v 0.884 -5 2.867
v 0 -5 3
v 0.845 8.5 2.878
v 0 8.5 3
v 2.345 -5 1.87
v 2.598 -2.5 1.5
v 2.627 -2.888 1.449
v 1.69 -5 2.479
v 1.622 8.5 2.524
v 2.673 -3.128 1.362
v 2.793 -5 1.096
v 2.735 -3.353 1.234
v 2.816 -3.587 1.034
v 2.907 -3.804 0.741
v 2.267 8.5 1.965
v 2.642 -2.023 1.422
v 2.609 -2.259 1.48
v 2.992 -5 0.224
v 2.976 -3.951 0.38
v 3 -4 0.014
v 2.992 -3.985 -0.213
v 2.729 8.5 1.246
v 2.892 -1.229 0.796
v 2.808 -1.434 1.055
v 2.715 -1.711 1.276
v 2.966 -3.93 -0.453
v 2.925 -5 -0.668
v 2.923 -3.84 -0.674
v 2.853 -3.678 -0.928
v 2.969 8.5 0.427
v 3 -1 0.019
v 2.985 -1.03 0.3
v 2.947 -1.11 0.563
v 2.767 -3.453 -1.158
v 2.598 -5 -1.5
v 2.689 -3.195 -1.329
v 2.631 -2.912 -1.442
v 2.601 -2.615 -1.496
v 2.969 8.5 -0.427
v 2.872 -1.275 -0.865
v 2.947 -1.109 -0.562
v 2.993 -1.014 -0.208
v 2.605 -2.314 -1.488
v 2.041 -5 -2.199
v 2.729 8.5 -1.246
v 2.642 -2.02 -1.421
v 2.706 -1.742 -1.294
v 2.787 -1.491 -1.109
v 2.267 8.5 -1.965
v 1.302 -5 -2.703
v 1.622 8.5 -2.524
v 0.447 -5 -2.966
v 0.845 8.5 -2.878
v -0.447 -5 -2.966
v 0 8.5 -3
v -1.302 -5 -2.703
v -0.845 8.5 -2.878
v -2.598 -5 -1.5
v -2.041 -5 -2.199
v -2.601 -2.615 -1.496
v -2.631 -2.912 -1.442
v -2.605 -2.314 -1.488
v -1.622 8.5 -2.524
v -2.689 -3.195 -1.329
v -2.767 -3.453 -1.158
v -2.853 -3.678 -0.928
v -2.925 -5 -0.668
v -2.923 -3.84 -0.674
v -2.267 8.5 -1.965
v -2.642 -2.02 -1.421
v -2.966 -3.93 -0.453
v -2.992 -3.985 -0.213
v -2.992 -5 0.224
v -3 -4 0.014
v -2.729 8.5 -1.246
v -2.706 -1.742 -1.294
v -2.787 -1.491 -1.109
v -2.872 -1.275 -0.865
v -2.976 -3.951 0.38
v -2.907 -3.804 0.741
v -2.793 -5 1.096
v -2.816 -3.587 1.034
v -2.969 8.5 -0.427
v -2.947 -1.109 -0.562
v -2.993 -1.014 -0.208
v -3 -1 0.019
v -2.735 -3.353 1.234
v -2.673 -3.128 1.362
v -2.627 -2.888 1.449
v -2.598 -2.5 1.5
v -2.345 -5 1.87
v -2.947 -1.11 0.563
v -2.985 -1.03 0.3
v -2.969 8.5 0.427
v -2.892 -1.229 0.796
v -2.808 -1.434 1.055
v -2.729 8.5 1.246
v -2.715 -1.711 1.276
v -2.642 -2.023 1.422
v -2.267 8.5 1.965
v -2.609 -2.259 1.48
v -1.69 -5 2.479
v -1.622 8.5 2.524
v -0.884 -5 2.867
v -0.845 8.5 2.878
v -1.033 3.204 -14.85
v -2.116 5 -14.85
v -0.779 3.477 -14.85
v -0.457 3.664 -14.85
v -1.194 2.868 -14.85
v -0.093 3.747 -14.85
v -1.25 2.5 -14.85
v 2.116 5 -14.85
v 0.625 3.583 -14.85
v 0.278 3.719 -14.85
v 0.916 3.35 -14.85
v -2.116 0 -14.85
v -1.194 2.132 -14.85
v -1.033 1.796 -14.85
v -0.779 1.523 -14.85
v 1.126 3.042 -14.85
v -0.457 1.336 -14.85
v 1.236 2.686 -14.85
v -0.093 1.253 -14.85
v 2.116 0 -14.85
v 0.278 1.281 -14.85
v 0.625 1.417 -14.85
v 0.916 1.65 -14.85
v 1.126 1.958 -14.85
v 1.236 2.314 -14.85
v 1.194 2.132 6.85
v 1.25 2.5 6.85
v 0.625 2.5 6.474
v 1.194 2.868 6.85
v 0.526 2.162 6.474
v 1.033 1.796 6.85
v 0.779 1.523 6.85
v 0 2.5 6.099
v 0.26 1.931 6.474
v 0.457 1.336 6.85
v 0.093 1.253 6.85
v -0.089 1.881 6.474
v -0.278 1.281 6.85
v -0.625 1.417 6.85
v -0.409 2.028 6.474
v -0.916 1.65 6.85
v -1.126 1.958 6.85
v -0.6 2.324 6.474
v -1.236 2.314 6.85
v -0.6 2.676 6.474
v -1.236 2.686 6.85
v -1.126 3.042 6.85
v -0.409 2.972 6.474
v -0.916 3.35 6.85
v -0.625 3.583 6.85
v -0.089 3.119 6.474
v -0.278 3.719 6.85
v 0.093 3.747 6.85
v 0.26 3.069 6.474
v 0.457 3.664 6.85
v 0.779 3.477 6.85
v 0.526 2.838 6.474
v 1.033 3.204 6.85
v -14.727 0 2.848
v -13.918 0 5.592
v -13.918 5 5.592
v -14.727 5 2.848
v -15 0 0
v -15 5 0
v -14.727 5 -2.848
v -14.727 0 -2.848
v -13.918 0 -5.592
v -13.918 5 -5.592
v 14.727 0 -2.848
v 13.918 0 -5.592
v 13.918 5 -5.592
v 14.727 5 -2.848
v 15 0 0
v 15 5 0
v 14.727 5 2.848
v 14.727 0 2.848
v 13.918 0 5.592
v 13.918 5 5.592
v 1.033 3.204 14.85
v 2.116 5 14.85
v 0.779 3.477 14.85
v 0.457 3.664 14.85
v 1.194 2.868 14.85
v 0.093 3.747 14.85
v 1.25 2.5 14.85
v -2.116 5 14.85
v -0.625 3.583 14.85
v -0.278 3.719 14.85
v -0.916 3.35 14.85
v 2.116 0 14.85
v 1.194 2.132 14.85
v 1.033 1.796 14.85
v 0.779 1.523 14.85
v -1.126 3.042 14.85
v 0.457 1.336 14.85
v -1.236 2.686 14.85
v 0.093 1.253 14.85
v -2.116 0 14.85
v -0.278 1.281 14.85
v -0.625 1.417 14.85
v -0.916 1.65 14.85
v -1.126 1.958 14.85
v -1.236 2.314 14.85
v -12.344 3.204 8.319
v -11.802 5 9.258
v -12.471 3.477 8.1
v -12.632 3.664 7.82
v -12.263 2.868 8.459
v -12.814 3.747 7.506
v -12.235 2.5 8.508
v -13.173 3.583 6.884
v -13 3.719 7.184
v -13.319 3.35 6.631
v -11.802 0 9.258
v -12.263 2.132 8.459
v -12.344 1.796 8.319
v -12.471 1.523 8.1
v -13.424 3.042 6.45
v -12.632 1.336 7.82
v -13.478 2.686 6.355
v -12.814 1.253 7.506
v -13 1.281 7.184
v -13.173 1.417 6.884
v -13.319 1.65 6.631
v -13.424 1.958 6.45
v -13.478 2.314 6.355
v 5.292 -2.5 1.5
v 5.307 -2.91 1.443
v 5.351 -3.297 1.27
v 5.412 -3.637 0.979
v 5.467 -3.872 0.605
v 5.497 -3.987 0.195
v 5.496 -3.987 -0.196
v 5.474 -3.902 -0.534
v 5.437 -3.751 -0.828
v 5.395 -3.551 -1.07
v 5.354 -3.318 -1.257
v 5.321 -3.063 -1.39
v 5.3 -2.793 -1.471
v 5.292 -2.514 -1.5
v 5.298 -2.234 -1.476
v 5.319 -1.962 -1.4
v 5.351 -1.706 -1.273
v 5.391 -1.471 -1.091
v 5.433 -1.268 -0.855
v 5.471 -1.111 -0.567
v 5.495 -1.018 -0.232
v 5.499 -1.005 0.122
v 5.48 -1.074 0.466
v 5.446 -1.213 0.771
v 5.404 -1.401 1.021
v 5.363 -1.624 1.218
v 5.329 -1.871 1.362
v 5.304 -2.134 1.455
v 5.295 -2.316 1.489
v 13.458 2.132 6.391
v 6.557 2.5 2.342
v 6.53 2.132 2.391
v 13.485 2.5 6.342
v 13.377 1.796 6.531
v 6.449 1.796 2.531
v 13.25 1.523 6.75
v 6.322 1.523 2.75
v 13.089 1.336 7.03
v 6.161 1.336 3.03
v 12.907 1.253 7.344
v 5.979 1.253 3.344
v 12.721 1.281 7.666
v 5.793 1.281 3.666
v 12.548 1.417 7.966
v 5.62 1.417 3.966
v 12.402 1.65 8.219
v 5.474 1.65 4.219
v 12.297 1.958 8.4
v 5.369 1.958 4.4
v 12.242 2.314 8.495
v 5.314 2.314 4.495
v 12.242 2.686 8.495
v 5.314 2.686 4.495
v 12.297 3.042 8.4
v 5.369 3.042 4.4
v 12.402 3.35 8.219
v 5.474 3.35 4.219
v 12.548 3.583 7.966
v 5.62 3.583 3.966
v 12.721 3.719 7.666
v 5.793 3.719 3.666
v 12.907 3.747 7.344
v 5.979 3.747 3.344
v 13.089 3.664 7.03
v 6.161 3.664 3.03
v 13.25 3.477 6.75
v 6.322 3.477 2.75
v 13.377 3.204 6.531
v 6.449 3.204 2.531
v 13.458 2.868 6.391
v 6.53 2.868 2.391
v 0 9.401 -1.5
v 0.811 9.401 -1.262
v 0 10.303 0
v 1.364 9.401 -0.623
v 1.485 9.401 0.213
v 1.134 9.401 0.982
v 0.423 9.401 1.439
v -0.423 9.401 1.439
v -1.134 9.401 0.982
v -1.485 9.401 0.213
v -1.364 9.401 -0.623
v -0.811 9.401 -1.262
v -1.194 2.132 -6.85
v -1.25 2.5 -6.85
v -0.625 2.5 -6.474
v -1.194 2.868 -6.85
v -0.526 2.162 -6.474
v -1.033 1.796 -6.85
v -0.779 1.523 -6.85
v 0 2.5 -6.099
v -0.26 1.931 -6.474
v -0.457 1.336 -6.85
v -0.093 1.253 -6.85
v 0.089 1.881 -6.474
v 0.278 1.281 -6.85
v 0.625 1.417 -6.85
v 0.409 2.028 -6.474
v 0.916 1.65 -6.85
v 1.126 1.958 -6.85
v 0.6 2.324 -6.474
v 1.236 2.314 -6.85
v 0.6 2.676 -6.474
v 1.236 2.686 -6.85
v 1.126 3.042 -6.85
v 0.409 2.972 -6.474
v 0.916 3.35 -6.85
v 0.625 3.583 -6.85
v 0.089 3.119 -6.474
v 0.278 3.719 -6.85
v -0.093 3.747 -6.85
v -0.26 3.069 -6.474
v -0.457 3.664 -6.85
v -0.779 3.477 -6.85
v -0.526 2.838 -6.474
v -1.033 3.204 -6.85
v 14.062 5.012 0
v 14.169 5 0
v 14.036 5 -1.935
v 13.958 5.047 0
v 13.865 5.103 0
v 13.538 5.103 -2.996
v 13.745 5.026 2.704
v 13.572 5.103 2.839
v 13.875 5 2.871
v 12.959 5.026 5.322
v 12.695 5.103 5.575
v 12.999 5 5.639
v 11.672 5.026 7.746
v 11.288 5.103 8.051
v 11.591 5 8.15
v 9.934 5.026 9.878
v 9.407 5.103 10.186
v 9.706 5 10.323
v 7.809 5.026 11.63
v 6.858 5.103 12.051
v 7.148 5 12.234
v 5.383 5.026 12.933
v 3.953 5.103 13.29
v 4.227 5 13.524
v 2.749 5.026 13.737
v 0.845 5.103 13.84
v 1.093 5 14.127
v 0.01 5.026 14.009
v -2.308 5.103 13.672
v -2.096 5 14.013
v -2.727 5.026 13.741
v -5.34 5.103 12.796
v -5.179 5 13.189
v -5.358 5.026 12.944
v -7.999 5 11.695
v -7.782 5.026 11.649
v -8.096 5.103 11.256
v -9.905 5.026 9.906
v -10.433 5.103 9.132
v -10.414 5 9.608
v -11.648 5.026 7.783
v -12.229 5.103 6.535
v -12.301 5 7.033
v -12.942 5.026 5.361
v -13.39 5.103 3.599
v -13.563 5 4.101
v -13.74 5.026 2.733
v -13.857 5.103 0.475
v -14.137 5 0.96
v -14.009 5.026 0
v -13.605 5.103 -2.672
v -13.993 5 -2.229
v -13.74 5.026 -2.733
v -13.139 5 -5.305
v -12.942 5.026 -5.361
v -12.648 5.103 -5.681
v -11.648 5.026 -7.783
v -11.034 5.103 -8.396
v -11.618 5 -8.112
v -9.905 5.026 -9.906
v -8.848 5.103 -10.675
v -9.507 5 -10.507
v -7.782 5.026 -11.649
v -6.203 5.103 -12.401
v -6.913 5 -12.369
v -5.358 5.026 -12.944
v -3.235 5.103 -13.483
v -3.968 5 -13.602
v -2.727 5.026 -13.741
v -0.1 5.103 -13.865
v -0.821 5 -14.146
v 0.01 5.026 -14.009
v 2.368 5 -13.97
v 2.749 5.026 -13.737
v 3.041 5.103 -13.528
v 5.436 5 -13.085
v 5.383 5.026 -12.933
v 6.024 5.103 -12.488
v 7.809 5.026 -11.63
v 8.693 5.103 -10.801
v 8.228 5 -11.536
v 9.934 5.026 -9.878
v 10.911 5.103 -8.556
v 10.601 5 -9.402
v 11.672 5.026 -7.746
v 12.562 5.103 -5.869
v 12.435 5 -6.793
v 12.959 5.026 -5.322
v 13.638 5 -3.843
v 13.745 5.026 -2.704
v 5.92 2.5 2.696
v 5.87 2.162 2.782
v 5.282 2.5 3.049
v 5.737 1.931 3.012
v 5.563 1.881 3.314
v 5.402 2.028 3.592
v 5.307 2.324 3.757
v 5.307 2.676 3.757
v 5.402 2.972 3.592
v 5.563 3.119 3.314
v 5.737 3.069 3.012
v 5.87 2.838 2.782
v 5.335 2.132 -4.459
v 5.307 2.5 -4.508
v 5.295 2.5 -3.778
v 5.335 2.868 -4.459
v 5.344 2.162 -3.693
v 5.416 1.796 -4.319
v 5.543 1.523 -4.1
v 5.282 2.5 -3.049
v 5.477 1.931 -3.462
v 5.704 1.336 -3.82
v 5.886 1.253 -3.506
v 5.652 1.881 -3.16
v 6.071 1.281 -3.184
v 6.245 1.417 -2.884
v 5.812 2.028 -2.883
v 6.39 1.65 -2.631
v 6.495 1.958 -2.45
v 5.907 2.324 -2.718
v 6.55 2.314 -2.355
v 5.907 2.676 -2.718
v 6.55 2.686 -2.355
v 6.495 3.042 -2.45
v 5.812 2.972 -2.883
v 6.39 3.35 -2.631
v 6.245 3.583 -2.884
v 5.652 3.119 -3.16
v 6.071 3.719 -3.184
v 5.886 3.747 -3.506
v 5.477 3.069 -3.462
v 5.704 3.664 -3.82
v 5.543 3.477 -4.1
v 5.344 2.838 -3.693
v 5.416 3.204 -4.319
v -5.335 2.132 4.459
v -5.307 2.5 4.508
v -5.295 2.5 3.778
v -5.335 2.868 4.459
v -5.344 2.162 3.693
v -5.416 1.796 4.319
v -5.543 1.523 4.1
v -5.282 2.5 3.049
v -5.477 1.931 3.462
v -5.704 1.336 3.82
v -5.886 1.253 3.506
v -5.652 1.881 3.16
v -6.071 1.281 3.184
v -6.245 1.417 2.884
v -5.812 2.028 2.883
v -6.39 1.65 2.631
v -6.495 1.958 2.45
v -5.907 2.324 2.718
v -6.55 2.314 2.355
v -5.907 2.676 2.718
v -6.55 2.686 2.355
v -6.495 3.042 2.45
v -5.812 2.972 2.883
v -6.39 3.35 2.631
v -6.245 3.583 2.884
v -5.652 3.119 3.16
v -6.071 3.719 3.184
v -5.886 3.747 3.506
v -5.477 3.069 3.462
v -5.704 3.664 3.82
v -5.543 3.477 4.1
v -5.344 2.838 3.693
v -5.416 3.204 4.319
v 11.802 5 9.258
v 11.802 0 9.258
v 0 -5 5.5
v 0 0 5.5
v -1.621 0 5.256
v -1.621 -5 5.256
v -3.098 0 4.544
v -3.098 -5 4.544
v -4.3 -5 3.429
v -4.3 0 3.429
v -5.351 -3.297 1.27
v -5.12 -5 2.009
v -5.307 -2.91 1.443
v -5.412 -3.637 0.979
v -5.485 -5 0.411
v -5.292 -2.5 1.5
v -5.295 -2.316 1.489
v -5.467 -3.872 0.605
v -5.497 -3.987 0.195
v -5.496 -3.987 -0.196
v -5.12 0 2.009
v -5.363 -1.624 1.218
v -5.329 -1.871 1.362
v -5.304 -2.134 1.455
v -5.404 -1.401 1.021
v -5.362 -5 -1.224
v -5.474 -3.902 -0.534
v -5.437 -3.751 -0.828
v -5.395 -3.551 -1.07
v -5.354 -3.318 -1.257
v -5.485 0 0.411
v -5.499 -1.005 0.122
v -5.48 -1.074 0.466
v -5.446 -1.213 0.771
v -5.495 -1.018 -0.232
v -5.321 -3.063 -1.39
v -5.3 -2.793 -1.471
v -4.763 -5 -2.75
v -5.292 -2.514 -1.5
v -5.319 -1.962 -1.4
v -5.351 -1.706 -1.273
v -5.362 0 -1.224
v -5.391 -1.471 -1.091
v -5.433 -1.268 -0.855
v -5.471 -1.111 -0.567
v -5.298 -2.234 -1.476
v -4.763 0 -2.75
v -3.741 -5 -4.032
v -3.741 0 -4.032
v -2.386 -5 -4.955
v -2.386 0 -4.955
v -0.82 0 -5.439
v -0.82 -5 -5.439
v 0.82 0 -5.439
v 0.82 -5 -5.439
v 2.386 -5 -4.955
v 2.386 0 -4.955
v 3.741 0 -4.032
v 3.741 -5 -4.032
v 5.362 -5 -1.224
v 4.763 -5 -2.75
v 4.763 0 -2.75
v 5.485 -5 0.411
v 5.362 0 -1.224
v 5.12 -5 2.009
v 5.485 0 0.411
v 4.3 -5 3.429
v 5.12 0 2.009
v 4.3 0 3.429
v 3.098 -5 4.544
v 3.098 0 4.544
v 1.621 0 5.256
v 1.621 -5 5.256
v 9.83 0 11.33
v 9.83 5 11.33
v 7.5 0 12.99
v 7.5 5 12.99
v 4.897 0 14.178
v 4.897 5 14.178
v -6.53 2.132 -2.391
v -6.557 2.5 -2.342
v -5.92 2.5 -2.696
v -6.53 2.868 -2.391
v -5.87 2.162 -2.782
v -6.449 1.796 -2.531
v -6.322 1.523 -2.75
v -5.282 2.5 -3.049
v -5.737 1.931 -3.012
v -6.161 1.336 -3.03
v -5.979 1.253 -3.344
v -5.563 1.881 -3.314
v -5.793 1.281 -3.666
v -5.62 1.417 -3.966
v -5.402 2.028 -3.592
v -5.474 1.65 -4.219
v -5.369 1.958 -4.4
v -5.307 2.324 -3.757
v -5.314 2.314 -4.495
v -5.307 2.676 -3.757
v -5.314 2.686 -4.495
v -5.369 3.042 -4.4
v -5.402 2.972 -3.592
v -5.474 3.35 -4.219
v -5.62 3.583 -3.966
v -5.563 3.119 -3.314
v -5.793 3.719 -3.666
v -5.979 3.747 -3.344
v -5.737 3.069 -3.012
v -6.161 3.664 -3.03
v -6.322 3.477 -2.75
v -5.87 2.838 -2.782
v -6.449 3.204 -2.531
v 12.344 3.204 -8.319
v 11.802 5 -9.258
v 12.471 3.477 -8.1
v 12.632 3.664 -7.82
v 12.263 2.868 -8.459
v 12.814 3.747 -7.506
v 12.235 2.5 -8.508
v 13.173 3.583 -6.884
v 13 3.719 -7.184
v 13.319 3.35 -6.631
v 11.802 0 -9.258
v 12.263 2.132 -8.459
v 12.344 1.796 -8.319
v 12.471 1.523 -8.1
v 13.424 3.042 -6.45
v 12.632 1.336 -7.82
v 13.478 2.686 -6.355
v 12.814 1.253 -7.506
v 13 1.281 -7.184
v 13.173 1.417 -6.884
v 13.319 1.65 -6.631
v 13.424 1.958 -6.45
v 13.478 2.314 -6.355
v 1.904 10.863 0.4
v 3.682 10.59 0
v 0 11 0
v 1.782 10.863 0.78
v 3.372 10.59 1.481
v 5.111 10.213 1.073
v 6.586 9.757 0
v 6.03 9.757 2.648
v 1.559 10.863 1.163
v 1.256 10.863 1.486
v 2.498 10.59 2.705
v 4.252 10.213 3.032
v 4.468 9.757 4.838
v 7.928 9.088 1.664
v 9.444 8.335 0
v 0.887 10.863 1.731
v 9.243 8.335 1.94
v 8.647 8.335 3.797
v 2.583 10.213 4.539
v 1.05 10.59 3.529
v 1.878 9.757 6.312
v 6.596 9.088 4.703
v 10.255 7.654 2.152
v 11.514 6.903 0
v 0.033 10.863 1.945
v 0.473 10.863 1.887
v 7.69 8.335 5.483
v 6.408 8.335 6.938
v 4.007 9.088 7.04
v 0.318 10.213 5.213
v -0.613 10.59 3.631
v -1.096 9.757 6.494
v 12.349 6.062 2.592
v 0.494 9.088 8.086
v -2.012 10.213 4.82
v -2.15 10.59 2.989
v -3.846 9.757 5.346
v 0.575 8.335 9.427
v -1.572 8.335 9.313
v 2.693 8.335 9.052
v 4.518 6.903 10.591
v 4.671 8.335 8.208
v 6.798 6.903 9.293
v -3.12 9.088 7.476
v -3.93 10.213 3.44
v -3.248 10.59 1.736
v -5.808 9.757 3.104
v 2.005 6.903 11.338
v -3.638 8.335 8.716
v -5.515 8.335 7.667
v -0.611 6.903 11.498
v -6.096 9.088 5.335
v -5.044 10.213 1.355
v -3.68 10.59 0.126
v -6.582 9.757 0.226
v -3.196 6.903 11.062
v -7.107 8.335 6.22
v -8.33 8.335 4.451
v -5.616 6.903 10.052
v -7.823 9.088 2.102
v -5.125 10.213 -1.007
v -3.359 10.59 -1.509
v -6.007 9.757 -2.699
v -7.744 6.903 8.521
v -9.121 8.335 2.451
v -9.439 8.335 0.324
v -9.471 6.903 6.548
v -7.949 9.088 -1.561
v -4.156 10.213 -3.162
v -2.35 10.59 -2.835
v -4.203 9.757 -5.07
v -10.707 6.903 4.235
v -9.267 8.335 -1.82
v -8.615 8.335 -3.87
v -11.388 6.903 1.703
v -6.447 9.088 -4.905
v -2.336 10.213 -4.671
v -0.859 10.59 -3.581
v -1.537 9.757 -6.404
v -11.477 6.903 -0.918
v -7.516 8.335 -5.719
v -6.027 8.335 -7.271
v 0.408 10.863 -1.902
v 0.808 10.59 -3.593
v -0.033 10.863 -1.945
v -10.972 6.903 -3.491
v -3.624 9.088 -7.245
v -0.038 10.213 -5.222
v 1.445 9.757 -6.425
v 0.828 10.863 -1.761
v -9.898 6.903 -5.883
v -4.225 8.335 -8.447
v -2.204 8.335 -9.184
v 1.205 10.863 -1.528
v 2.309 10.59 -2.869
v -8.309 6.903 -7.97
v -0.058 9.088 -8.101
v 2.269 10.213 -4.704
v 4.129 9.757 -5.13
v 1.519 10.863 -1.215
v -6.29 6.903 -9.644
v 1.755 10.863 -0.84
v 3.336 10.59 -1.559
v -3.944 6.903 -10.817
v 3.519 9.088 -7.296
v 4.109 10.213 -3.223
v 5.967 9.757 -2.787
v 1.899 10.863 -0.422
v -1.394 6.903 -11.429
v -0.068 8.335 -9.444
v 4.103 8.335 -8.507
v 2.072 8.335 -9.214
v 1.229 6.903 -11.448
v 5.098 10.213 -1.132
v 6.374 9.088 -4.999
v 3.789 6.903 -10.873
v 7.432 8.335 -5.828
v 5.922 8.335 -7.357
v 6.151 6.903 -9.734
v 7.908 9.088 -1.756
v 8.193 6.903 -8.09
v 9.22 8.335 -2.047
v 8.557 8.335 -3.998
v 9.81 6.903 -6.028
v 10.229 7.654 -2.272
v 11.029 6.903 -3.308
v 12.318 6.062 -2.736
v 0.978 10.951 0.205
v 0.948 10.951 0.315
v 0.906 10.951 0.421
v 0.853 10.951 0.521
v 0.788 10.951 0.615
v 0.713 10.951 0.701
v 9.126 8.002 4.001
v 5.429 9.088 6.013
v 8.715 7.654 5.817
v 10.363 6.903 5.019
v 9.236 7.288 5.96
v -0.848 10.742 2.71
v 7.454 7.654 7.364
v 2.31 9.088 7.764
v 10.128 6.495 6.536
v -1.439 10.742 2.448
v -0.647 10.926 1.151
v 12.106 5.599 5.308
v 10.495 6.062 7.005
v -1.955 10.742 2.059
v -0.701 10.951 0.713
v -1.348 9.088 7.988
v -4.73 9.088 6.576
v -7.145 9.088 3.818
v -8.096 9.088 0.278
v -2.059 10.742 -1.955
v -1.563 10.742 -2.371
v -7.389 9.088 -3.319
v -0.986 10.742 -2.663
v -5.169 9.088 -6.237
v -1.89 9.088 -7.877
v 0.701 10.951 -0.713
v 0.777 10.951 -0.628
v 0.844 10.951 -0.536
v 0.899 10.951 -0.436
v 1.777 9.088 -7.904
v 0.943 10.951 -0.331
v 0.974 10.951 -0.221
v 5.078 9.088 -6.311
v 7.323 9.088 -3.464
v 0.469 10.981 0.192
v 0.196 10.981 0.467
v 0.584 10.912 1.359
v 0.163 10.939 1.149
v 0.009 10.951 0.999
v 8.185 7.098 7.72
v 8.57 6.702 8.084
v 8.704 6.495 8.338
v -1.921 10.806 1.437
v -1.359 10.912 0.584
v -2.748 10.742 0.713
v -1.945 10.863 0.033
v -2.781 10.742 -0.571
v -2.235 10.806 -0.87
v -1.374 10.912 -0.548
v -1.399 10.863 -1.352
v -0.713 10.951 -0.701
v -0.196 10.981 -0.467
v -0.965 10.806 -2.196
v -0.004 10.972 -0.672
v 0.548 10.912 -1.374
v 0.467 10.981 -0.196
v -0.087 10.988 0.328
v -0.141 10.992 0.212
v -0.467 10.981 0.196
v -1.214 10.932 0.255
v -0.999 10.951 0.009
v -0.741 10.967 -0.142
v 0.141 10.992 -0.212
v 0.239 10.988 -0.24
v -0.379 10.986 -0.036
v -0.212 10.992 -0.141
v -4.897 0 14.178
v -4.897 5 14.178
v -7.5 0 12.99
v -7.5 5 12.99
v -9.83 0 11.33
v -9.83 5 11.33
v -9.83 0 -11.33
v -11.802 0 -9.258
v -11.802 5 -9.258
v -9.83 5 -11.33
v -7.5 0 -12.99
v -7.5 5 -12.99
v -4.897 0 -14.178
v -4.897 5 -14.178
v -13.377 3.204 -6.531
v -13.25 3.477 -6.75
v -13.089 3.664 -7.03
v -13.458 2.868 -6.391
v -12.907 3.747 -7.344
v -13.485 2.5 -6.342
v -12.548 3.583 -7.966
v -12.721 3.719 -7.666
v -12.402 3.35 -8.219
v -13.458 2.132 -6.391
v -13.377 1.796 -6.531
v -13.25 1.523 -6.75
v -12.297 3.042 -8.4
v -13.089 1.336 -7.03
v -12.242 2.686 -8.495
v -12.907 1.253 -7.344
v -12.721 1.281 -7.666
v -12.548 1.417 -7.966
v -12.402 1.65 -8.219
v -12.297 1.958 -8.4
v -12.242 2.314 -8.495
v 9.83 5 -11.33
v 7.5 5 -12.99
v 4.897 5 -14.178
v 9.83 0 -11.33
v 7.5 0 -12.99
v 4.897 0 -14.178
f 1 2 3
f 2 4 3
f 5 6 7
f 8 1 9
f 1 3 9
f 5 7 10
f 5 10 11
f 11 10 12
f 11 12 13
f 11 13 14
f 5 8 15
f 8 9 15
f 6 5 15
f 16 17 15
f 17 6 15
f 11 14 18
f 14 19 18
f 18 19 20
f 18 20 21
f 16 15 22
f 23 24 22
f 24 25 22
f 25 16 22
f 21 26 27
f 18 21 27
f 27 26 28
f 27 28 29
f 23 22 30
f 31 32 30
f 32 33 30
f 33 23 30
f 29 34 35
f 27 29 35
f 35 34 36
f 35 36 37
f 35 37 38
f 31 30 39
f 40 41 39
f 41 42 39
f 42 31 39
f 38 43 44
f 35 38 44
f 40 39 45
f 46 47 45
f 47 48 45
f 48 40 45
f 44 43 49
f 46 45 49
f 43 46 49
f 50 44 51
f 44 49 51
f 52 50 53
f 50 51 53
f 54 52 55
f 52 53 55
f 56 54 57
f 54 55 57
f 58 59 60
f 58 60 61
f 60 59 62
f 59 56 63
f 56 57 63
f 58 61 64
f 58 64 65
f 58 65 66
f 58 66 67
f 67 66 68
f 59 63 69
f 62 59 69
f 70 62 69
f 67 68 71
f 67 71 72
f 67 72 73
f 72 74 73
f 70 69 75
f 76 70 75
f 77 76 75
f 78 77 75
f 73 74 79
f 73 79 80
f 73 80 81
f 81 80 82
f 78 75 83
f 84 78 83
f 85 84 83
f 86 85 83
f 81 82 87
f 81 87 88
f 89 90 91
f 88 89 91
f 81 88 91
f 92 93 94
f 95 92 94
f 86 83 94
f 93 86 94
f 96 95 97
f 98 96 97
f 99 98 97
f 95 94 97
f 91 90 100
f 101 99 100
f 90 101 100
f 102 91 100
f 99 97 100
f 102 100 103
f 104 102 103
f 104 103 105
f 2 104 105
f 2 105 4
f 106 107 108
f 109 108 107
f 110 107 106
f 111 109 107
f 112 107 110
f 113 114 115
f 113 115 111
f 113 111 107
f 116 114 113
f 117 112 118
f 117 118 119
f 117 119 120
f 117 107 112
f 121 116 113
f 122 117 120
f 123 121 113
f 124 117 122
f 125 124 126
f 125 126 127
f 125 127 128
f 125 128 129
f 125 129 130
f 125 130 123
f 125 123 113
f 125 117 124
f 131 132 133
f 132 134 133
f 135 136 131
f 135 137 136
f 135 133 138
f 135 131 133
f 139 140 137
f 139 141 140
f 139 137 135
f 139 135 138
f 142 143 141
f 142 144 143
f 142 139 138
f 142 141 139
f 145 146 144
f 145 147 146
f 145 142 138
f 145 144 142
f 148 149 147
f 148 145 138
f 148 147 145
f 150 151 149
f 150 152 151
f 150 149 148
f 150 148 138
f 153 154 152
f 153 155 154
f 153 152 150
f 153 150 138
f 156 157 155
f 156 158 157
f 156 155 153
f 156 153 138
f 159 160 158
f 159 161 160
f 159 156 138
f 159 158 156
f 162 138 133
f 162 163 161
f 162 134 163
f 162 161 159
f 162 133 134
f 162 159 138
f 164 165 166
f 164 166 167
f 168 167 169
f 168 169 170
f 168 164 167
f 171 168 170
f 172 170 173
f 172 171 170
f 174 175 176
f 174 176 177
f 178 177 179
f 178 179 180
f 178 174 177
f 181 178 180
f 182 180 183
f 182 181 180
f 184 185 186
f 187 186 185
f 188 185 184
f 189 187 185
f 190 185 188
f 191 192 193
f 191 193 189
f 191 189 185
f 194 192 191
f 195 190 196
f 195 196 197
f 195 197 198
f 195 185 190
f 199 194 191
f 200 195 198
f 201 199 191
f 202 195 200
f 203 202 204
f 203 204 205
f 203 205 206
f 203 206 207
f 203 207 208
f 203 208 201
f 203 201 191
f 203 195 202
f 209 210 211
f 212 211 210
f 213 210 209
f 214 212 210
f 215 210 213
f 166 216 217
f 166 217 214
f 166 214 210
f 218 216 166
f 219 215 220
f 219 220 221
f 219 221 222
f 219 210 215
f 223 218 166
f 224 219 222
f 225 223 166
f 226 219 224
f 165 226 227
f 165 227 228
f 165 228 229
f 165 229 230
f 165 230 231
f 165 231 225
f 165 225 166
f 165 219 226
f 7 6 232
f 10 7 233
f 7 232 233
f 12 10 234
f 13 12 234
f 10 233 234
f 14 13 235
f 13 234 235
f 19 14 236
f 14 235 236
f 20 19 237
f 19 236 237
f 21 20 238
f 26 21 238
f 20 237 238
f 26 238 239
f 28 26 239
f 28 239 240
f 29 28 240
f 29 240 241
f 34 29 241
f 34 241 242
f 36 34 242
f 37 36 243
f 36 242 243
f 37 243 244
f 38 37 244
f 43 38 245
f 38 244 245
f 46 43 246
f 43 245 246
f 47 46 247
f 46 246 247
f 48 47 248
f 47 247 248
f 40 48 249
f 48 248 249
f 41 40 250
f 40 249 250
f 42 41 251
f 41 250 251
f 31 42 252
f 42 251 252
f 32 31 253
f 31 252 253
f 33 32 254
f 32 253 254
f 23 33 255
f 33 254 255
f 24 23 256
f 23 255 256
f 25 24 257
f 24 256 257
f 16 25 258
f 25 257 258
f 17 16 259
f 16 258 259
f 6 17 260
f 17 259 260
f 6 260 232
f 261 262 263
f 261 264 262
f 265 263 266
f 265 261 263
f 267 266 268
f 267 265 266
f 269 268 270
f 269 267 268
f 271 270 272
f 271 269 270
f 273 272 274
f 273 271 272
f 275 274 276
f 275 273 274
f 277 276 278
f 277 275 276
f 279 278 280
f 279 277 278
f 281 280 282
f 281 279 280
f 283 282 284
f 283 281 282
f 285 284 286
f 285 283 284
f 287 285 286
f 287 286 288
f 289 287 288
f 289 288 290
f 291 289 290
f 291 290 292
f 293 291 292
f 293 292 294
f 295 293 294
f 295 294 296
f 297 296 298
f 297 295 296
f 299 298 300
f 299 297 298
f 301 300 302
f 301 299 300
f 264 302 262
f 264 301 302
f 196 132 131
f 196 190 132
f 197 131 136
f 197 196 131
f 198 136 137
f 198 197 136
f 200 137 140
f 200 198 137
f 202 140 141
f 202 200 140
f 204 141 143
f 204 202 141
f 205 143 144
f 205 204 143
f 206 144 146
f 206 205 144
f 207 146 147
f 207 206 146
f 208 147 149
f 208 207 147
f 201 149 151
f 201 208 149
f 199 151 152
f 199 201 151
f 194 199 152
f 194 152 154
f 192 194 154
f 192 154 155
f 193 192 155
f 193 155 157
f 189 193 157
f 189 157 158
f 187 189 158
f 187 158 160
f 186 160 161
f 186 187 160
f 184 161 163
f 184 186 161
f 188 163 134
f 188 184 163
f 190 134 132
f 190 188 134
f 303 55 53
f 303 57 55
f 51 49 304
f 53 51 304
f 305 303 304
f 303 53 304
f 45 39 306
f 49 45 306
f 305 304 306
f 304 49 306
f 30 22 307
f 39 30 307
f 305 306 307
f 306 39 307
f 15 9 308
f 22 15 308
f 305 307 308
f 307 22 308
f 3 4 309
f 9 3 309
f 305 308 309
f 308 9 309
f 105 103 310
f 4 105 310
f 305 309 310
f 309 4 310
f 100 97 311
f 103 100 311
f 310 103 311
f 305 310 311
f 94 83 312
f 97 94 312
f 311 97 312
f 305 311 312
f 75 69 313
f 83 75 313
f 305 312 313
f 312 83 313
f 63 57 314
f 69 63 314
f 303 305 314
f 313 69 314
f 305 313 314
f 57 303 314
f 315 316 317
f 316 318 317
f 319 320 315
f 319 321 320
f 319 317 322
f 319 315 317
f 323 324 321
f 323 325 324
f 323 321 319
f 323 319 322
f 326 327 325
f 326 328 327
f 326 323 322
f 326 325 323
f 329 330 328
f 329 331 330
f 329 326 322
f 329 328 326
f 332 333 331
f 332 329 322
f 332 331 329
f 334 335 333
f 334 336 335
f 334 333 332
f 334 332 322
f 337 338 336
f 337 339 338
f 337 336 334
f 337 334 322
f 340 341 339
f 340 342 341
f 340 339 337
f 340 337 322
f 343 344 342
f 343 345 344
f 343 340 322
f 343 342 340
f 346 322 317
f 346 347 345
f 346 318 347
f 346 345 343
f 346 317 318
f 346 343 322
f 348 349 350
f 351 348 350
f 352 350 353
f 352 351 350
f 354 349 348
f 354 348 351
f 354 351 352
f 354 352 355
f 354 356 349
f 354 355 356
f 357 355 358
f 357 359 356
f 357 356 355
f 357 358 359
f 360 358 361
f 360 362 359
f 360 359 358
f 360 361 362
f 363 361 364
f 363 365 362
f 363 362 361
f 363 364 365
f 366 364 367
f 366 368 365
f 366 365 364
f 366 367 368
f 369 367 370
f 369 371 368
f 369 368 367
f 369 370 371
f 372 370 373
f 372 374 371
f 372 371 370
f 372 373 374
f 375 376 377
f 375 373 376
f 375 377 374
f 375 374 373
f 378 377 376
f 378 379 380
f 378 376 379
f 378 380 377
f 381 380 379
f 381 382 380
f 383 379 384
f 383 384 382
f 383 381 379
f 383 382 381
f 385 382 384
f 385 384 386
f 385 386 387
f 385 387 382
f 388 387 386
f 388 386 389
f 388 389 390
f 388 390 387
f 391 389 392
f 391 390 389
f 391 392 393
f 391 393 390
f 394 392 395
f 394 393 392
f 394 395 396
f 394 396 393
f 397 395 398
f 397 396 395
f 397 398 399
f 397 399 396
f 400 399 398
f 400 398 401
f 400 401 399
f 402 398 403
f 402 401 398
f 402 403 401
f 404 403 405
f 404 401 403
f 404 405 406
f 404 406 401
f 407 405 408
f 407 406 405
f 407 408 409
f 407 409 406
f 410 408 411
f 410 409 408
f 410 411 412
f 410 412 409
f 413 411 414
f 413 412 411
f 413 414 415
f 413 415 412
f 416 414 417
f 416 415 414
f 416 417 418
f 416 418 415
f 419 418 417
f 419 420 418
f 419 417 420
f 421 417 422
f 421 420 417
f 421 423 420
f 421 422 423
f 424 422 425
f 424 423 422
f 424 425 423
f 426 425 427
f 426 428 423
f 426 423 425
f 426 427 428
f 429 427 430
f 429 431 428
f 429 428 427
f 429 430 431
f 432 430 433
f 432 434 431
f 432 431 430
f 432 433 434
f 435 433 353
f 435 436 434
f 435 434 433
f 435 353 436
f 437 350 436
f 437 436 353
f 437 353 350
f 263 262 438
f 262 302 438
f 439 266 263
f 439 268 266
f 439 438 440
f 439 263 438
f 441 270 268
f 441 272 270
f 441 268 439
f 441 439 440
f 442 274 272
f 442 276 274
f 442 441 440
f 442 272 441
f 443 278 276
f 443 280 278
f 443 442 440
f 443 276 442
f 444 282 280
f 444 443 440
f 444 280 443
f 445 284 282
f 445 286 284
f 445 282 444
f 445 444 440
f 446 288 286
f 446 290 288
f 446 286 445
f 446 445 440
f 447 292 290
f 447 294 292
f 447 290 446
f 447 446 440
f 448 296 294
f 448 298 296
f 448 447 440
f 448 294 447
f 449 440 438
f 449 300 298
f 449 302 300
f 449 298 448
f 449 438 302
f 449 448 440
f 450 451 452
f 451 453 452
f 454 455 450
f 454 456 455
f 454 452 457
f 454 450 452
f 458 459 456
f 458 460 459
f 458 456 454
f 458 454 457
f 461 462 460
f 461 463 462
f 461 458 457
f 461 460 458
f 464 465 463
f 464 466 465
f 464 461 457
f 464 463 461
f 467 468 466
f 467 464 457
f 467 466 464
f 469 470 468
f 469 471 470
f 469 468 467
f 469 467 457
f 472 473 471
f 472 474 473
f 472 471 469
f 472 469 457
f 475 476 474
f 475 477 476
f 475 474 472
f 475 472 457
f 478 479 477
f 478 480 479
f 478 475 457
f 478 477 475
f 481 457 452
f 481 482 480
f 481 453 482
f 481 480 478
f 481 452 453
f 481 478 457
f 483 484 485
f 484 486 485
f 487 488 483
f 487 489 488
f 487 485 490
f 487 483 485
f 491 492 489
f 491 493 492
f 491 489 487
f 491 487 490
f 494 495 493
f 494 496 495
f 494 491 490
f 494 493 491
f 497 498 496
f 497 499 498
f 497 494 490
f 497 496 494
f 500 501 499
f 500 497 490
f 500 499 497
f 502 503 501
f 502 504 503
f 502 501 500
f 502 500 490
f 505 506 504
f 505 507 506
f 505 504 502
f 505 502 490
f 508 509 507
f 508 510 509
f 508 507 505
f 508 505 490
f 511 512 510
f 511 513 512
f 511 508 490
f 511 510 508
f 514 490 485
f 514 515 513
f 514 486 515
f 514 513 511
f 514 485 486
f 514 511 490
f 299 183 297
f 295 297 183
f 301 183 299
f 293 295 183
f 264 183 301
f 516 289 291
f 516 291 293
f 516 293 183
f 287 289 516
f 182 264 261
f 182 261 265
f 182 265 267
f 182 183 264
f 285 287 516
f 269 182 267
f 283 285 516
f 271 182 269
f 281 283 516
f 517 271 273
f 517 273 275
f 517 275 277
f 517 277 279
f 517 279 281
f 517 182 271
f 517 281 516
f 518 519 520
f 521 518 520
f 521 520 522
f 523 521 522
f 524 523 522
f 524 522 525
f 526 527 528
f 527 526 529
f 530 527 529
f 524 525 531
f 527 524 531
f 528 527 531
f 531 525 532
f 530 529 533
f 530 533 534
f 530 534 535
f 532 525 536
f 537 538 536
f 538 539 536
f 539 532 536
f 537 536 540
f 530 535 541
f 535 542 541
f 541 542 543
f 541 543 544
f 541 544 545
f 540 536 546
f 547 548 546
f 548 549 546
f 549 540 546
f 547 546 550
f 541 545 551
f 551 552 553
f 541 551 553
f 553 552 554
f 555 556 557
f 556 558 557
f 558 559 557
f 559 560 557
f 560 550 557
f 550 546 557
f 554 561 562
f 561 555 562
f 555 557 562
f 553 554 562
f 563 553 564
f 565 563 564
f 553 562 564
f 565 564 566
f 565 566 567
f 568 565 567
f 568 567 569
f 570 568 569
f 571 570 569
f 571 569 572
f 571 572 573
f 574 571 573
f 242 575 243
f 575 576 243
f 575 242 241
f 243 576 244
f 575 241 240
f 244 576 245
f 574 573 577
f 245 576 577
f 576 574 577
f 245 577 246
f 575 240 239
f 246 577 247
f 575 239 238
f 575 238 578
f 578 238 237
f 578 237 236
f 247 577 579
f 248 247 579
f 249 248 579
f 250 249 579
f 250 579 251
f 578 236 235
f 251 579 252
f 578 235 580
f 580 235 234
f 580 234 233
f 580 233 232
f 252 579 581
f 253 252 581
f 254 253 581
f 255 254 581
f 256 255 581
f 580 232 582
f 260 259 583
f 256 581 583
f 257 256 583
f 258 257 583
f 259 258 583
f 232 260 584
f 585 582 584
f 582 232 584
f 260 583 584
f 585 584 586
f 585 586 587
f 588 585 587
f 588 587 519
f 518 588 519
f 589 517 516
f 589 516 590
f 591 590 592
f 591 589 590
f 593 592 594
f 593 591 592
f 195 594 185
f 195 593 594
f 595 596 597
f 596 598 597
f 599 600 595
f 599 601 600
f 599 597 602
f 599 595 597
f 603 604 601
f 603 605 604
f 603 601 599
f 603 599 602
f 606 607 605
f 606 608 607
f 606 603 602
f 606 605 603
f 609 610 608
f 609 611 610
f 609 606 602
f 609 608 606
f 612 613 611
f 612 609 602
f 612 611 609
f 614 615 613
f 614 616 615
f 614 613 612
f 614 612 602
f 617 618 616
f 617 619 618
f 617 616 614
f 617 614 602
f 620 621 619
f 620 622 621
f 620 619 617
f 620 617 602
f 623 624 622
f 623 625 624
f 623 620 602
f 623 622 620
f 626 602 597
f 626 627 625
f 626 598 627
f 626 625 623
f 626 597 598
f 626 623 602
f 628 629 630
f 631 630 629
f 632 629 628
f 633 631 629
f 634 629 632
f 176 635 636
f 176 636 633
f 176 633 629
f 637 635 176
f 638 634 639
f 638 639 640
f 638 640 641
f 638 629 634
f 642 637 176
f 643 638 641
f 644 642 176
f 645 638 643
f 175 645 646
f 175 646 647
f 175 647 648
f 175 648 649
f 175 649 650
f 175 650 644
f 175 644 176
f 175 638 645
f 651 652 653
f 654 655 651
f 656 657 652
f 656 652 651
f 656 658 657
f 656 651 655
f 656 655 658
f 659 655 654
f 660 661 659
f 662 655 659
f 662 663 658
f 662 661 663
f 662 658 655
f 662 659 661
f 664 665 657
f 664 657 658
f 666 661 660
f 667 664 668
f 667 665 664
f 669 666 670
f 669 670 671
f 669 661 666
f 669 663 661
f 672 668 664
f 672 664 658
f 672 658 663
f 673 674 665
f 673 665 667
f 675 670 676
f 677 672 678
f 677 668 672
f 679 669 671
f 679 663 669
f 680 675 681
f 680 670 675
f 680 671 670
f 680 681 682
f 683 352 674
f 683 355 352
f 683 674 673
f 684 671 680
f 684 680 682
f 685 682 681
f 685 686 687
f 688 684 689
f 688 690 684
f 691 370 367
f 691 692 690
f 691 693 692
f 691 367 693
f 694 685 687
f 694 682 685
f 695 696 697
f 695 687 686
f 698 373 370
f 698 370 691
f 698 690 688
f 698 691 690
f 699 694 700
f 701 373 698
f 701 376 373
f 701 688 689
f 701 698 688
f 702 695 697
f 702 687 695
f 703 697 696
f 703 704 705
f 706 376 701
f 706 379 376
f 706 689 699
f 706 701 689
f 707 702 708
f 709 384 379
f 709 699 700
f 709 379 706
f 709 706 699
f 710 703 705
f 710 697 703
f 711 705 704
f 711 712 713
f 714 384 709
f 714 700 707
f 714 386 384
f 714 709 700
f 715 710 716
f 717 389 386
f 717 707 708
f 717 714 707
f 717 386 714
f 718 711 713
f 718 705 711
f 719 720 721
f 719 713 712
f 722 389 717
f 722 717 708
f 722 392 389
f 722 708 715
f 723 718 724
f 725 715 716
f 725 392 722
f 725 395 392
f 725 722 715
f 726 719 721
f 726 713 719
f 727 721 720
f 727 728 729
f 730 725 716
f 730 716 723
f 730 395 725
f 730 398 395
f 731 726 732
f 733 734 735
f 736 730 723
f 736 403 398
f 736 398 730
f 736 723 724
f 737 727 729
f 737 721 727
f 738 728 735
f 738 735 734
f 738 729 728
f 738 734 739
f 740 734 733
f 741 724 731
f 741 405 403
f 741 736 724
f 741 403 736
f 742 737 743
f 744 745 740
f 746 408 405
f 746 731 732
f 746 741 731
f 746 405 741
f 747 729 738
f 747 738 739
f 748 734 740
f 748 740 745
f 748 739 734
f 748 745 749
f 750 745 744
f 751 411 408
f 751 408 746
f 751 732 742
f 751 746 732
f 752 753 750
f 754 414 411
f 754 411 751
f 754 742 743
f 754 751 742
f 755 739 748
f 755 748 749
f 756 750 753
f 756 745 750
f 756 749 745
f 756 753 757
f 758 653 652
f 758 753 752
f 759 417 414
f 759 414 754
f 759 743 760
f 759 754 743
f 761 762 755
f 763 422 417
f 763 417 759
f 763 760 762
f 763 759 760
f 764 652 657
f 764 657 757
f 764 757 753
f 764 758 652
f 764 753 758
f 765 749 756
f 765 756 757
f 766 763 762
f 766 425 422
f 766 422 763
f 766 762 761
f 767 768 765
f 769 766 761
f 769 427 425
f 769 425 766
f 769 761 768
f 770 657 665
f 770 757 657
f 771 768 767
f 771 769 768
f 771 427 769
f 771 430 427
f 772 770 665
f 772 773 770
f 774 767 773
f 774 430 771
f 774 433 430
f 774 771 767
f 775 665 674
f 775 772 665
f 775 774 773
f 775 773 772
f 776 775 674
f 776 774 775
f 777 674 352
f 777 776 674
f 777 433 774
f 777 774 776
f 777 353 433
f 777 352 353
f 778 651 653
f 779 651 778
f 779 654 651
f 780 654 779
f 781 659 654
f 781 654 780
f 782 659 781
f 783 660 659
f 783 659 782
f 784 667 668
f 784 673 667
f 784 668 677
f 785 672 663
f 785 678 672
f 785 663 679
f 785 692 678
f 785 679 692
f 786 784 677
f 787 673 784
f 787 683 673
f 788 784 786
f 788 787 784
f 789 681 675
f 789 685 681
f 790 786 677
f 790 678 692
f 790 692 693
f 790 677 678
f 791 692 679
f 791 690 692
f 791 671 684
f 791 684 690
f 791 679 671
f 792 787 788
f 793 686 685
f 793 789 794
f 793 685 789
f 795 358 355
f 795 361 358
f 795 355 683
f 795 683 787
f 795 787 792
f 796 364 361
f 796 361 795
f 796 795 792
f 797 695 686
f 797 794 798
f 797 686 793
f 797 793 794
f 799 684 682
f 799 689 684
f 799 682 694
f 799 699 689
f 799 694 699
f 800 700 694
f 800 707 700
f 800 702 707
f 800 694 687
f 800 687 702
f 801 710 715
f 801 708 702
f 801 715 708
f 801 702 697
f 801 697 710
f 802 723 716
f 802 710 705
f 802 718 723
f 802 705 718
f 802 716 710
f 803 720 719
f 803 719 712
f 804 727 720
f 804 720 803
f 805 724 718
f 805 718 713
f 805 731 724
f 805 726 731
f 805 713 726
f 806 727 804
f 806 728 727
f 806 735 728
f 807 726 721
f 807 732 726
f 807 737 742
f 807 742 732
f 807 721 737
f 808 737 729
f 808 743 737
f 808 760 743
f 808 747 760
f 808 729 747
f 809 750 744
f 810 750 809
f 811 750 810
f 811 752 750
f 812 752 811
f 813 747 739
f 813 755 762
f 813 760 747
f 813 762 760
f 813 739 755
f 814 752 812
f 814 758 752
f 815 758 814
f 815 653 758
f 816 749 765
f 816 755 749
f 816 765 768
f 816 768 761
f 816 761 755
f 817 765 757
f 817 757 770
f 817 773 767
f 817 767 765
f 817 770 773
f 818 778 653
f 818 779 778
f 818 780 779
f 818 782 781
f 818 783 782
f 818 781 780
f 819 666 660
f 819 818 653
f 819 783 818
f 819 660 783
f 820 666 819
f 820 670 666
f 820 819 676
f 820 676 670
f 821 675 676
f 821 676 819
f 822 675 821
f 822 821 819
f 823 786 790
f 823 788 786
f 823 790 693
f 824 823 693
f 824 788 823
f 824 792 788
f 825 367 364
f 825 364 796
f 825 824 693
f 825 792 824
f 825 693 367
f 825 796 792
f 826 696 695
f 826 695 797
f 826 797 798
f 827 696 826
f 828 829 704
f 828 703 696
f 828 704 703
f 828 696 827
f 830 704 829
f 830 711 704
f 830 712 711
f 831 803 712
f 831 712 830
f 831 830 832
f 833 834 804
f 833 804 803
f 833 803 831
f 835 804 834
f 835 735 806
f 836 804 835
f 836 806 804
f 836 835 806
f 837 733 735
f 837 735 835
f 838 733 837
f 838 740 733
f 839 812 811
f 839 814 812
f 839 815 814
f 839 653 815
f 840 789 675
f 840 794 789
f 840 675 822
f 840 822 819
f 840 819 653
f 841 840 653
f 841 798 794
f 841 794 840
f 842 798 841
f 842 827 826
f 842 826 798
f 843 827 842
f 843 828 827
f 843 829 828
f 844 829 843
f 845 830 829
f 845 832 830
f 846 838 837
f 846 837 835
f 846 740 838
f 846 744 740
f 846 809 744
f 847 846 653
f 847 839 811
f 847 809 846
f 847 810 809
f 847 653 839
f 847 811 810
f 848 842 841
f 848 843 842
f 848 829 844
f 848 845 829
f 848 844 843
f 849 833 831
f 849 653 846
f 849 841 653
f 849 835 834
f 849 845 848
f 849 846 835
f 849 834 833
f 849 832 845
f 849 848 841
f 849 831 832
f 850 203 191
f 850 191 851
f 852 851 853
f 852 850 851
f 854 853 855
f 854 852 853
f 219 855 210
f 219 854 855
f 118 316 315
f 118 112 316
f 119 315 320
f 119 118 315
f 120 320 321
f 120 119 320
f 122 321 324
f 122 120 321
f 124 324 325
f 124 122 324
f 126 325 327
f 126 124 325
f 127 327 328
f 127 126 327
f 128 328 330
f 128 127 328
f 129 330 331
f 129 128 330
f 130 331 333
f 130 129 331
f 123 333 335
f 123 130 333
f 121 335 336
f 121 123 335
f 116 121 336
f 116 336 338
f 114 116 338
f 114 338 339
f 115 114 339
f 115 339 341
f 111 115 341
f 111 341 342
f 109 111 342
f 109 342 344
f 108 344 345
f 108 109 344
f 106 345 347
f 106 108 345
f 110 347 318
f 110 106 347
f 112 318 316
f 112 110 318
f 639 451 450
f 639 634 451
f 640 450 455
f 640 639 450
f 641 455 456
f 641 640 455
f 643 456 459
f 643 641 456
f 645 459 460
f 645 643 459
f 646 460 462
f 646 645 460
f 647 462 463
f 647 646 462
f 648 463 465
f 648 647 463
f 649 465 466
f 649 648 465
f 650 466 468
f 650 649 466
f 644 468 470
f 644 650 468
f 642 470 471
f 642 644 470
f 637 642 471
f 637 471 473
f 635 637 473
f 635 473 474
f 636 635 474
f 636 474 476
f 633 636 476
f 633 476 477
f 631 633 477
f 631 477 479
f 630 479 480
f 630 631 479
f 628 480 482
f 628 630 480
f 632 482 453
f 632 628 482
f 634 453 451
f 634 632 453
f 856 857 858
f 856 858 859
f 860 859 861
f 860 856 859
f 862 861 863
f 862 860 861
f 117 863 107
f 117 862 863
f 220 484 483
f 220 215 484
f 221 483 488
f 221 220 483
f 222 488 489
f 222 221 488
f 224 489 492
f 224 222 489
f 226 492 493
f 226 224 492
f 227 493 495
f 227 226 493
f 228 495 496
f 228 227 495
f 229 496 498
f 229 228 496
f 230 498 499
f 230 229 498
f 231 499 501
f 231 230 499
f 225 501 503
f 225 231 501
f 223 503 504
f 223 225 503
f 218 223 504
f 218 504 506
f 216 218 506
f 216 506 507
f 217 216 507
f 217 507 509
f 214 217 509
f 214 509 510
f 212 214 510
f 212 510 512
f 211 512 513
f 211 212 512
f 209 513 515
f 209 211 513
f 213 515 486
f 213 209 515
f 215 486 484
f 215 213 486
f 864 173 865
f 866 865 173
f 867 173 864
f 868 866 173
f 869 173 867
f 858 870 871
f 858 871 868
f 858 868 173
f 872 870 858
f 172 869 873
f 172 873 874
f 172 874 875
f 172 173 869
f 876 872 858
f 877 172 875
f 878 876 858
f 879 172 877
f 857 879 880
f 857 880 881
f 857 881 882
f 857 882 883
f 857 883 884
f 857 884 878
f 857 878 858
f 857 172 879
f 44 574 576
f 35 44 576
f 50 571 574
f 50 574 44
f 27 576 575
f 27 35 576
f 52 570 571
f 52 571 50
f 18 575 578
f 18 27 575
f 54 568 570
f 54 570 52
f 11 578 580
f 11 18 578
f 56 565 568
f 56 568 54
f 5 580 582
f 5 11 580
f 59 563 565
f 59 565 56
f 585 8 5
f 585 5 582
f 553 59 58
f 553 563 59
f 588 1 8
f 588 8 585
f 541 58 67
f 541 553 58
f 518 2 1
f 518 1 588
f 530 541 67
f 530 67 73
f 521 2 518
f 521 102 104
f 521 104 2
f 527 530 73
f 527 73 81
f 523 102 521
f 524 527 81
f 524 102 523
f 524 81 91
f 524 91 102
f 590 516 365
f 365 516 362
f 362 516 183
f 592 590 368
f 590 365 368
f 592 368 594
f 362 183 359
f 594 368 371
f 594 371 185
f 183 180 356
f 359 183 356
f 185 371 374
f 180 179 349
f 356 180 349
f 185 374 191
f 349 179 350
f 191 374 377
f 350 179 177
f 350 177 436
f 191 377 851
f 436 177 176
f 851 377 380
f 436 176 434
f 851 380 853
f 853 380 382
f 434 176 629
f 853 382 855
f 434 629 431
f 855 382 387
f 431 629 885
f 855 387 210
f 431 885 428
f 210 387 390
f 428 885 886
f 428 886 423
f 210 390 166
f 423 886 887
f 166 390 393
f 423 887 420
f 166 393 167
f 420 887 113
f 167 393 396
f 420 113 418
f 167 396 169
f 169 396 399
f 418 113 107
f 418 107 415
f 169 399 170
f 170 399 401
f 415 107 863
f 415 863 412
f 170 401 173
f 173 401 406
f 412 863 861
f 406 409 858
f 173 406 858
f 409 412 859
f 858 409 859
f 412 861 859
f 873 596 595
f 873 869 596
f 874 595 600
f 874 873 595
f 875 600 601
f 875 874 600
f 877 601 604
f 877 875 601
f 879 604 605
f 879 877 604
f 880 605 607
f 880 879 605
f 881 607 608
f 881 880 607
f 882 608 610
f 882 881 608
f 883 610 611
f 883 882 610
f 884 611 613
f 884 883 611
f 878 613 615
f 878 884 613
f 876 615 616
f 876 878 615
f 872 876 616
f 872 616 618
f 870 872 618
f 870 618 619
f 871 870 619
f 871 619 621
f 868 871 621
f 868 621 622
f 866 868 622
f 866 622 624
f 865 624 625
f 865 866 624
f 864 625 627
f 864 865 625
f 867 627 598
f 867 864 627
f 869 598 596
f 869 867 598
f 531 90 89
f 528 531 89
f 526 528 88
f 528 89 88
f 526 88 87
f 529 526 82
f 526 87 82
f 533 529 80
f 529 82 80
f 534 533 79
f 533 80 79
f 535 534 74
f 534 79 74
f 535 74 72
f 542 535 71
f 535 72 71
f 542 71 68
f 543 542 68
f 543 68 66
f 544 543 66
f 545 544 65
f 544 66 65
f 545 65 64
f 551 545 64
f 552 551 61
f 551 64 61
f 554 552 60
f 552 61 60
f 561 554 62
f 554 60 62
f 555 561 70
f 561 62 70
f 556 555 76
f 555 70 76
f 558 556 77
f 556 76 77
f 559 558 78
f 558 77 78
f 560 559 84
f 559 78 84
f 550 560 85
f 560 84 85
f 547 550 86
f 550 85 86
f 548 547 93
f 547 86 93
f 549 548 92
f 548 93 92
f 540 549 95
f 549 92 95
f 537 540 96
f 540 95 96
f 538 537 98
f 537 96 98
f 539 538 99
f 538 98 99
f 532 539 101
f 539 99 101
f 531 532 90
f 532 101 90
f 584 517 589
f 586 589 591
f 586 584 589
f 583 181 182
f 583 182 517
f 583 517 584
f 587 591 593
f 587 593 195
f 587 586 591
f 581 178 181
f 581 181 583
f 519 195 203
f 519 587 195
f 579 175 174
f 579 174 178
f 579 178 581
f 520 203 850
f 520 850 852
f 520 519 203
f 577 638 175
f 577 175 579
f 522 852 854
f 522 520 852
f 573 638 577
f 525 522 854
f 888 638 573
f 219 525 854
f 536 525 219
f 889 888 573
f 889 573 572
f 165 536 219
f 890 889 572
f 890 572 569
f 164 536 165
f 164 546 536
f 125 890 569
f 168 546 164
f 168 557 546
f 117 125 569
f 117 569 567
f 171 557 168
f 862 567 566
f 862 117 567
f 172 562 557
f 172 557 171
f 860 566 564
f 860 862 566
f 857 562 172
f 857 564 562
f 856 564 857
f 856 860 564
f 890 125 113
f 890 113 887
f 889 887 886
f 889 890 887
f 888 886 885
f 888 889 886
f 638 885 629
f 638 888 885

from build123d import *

# Parameters (mm, degrees)
EXTRUDE_1_DEPTH                         = 5
SKETCH_3_R                              = 5.5
EXTRUDE_2_DEPTH                         = 5
CUT_EXTRUDE_1083_REACH                  = 23.692
CUT_EXTRUDE_1083_END_RADIUS             = 5.5
SKETCH_6_R                              = 1.5
CUT_EXTRUDE_1083_DIRECTION_2_REACH      = 23.692
CUT_EXTRUDE_1083_DIRECTION_2_END_RADIUS = 5.5
FILLET_1_R                              = 0.5
PATTERN_CIRCULAR_1_COUNT                = 6
HOLE_WIZARD_6_0_6_1_D                   = 6
HOLE_WIZARD_6_0_6_1_DEPTH               = 13.5
HOLE_WIZARD_6_0_6_1_TIP                 = 1.802581857


with BuildPart() as part:
    # 草图1 → 凸台-拉伸1 (new body)
    with BuildSketch(Plane(origin=(0, 0, 0), x_dir=(1, 0, 0), z_dir=(0, 1, 0))):
        with BuildLine():
            Line((11.802472048, 9.257518758), (13.918482445, 5.592481242))
            ThreePointArc((13.918482445, 5.592481242), (15, 0), (13.918482445, -5.592481242))
            Line((13.918482445, -5.592481242), (11.802472048, -9.257518758))
            ThreePointArc((11.802472048, -9.257518758), (7.5, -12.990381057), (2.116010397, -14.85))
            Line((2.116010397, -14.85), (-2.116010397, -14.85))
            ThreePointArc((-2.116010397, -14.85), (-7.5, -12.990381057), (-11.802472048, -9.257518758))
            Line((-11.802472048, -9.257518758), (-13.918482445, -5.592481242))
            ThreePointArc((-13.918482445, -5.592481242), (-15, 0), (-13.918482445, 5.592481242))
            Line((-13.918482445, 5.592481242), (-11.802472048, 9.257518758))
            ThreePointArc((-11.802472048, 9.257518758), (-7.5, 12.990381057), (-2.116010397, 14.85))
            Line((-2.116010397, 14.85), (2.116010397, 14.85))
            ThreePointArc((2.116010397, 14.85), (7.5, 12.990381057), (11.802472048, 9.257518758))
        make_face()
    extrude(amount=EXTRUDE_1_DEPTH)

    # 草图3 → 凸台-拉伸2 (add)
    with BuildSketch(Plane.XZ):
        with Locations(Location((0, 0, 0), (0, 0, 90))):
            Circle(SKETCH_3_R)
    extrude(amount=EXTRUDE_2_DEPTH)

    # Cut-Extrude 1083: up to this cylinder (the profile starts inside it)
    cut_extrude_1083_end = Plane(origin=(0, -2.5, 0), z_dir=(0, 1, 0)) * Cylinder(CUT_EXTRUDE_1083_END_RADIUS, 59.384, mode=Mode.PRIVATE)
    # 草图6 → Cut-Extrude 1083 (cut, up to the surface)
    with BuildSketch(Plane(origin=(0, 0, 0), x_dir=(0, 0, -1), z_dir=(1, 0, 0)), mode=Mode.PRIVATE) as cut_extrude_1083_sk1:
        with Locations(Location((0, -2.5, 0), (0, 0, 180))):
            Circle(SKETCH_6_R)
    cut_extrude_1083_tool1 = extrude(cut_extrude_1083_sk1.sketch, amount=-CUT_EXTRUDE_1083_REACH, mode=Mode.PRIVATE) & cut_extrude_1083_end
    add(cut_extrude_1083_tool1.solids().sort_by_distance((0, -2.5, 0))[0], mode=Mode.SUBTRACT)

    # Cut-Extrude 1083 direction 2: up to this cylinder (the profile starts inside it)
    cut_extrude_1083_direction_2_end = Plane(origin=(0, -2.5, 0), z_dir=(0, 1, 0)) * Cylinder(CUT_EXTRUDE_1083_DIRECTION_2_END_RADIUS, 59.384, mode=Mode.PRIVATE)
    # 草图6 → Cut-Extrude 1083 direction 2 (cut, up to the surface)
    with BuildSketch(Plane(origin=(0, 0, 0), x_dir=(0, 0, -1), z_dir=(1, 0, 0)), mode=Mode.PRIVATE) as cut_extrude_1083_direction_2_sk1:
        with Locations(Location((0, -2.5, 0), (0, 0, 180))):
            Circle(SKETCH_6_R)
    cut_extrude_1083_direction_2_tool1 = extrude(cut_extrude_1083_direction_2_sk1.sketch, amount=CUT_EXTRUDE_1083_DIRECTION_2_REACH, mode=Mode.PRIVATE) & cut_extrude_1083_direction_2_end
    add(cut_extrude_1083_direction_2_tool1.solids().sort_by_distance((0, -2.5, 0))[0], mode=Mode.SUBTRACT)

    # 草图7 → 旋转1 (revolve)
    with BuildSketch(Plane.XY):
        with BuildLine():
            Line((0, 11), (0, 5))
            Line((0, 5), (14, 5))
            add(Edge.make_bspline(
                [(0, 11), (5.535231894, 10.848067736), (8.992417741, 9.000576886), (10.444270344, 7.717324106), (14, 5)],
                knots=[0, 0, 0, 0, 0, 1, 1, 1, 1, 1], degree=4))
        make_face()
    revolve(axis=Axis((0, 11, 0), (0, -1, 0)))

    # 圆角1
    fillet_1_edges = [part.edges().sort_by_distance(p)[0] for p in [
        (-14, 5, 0),
    ]]
    fillet(fillet_1_edges, radius=FILLET_1_R)

    # 草图8 → M3 螺纹孔1 (revolve, cut)
    with BuildSketch(Plane(origin=(12.860477246, 2.5, 7.425), x_dir=(0.4999999999999996, 0, -0.8660254037844389), z_dir=(0, 1, 0))):
        Polygon((0, 0), (0, 8.751075774), (1.25, 8), (1.25, 0), align=None)
    hole_wizard_m3_1 = revolve(axis=Axis((18.35973856, 2.5, 10.6), (-0.8660254037844389, 0, -0.49999999999999967)), mode=Mode.SUBTRACT)

    # 阵列(圆周)1: M3 螺纹孔1 ×6 about axis
    pattern_circular_1_axis = Axis((0, 0, 0), (0, 1, 0))
    for i in range(1, PATTERN_CIRCULAR_1_COUNT):
        add(hole_wizard_m3_1.rotate(pattern_circular_1_axis, i * 360 / PATTERN_CIRCULAR_1_COUNT), mode=Mode.SUBTRACT)

    # Ø6.0 (6) 直径孔1
    with Locations(Plane(origin=(0, -5, 0), x_dir=(0, 0, -1), z_dir=(0, -1, 0))):
        with Locations((0, 0)):
            Hole(HOLE_WIZARD_6_0_6_1_D / 2, depth=HOLE_WIZARD_6_0_6_1_DEPTH)
            with Locations((0, 0, -(HOLE_WIZARD_6_0_6_1_DEPTH + HOLE_WIZARD_6_0_6_1_TIP / 2))):  # 118° drill point
                Cone(0, HOLE_WIZARD_6_0_6_1_D / 2, HOLE_WIZARD_6_0_6_1_TIP, mode=Mode.SUBTRACT)


solid = part.part
